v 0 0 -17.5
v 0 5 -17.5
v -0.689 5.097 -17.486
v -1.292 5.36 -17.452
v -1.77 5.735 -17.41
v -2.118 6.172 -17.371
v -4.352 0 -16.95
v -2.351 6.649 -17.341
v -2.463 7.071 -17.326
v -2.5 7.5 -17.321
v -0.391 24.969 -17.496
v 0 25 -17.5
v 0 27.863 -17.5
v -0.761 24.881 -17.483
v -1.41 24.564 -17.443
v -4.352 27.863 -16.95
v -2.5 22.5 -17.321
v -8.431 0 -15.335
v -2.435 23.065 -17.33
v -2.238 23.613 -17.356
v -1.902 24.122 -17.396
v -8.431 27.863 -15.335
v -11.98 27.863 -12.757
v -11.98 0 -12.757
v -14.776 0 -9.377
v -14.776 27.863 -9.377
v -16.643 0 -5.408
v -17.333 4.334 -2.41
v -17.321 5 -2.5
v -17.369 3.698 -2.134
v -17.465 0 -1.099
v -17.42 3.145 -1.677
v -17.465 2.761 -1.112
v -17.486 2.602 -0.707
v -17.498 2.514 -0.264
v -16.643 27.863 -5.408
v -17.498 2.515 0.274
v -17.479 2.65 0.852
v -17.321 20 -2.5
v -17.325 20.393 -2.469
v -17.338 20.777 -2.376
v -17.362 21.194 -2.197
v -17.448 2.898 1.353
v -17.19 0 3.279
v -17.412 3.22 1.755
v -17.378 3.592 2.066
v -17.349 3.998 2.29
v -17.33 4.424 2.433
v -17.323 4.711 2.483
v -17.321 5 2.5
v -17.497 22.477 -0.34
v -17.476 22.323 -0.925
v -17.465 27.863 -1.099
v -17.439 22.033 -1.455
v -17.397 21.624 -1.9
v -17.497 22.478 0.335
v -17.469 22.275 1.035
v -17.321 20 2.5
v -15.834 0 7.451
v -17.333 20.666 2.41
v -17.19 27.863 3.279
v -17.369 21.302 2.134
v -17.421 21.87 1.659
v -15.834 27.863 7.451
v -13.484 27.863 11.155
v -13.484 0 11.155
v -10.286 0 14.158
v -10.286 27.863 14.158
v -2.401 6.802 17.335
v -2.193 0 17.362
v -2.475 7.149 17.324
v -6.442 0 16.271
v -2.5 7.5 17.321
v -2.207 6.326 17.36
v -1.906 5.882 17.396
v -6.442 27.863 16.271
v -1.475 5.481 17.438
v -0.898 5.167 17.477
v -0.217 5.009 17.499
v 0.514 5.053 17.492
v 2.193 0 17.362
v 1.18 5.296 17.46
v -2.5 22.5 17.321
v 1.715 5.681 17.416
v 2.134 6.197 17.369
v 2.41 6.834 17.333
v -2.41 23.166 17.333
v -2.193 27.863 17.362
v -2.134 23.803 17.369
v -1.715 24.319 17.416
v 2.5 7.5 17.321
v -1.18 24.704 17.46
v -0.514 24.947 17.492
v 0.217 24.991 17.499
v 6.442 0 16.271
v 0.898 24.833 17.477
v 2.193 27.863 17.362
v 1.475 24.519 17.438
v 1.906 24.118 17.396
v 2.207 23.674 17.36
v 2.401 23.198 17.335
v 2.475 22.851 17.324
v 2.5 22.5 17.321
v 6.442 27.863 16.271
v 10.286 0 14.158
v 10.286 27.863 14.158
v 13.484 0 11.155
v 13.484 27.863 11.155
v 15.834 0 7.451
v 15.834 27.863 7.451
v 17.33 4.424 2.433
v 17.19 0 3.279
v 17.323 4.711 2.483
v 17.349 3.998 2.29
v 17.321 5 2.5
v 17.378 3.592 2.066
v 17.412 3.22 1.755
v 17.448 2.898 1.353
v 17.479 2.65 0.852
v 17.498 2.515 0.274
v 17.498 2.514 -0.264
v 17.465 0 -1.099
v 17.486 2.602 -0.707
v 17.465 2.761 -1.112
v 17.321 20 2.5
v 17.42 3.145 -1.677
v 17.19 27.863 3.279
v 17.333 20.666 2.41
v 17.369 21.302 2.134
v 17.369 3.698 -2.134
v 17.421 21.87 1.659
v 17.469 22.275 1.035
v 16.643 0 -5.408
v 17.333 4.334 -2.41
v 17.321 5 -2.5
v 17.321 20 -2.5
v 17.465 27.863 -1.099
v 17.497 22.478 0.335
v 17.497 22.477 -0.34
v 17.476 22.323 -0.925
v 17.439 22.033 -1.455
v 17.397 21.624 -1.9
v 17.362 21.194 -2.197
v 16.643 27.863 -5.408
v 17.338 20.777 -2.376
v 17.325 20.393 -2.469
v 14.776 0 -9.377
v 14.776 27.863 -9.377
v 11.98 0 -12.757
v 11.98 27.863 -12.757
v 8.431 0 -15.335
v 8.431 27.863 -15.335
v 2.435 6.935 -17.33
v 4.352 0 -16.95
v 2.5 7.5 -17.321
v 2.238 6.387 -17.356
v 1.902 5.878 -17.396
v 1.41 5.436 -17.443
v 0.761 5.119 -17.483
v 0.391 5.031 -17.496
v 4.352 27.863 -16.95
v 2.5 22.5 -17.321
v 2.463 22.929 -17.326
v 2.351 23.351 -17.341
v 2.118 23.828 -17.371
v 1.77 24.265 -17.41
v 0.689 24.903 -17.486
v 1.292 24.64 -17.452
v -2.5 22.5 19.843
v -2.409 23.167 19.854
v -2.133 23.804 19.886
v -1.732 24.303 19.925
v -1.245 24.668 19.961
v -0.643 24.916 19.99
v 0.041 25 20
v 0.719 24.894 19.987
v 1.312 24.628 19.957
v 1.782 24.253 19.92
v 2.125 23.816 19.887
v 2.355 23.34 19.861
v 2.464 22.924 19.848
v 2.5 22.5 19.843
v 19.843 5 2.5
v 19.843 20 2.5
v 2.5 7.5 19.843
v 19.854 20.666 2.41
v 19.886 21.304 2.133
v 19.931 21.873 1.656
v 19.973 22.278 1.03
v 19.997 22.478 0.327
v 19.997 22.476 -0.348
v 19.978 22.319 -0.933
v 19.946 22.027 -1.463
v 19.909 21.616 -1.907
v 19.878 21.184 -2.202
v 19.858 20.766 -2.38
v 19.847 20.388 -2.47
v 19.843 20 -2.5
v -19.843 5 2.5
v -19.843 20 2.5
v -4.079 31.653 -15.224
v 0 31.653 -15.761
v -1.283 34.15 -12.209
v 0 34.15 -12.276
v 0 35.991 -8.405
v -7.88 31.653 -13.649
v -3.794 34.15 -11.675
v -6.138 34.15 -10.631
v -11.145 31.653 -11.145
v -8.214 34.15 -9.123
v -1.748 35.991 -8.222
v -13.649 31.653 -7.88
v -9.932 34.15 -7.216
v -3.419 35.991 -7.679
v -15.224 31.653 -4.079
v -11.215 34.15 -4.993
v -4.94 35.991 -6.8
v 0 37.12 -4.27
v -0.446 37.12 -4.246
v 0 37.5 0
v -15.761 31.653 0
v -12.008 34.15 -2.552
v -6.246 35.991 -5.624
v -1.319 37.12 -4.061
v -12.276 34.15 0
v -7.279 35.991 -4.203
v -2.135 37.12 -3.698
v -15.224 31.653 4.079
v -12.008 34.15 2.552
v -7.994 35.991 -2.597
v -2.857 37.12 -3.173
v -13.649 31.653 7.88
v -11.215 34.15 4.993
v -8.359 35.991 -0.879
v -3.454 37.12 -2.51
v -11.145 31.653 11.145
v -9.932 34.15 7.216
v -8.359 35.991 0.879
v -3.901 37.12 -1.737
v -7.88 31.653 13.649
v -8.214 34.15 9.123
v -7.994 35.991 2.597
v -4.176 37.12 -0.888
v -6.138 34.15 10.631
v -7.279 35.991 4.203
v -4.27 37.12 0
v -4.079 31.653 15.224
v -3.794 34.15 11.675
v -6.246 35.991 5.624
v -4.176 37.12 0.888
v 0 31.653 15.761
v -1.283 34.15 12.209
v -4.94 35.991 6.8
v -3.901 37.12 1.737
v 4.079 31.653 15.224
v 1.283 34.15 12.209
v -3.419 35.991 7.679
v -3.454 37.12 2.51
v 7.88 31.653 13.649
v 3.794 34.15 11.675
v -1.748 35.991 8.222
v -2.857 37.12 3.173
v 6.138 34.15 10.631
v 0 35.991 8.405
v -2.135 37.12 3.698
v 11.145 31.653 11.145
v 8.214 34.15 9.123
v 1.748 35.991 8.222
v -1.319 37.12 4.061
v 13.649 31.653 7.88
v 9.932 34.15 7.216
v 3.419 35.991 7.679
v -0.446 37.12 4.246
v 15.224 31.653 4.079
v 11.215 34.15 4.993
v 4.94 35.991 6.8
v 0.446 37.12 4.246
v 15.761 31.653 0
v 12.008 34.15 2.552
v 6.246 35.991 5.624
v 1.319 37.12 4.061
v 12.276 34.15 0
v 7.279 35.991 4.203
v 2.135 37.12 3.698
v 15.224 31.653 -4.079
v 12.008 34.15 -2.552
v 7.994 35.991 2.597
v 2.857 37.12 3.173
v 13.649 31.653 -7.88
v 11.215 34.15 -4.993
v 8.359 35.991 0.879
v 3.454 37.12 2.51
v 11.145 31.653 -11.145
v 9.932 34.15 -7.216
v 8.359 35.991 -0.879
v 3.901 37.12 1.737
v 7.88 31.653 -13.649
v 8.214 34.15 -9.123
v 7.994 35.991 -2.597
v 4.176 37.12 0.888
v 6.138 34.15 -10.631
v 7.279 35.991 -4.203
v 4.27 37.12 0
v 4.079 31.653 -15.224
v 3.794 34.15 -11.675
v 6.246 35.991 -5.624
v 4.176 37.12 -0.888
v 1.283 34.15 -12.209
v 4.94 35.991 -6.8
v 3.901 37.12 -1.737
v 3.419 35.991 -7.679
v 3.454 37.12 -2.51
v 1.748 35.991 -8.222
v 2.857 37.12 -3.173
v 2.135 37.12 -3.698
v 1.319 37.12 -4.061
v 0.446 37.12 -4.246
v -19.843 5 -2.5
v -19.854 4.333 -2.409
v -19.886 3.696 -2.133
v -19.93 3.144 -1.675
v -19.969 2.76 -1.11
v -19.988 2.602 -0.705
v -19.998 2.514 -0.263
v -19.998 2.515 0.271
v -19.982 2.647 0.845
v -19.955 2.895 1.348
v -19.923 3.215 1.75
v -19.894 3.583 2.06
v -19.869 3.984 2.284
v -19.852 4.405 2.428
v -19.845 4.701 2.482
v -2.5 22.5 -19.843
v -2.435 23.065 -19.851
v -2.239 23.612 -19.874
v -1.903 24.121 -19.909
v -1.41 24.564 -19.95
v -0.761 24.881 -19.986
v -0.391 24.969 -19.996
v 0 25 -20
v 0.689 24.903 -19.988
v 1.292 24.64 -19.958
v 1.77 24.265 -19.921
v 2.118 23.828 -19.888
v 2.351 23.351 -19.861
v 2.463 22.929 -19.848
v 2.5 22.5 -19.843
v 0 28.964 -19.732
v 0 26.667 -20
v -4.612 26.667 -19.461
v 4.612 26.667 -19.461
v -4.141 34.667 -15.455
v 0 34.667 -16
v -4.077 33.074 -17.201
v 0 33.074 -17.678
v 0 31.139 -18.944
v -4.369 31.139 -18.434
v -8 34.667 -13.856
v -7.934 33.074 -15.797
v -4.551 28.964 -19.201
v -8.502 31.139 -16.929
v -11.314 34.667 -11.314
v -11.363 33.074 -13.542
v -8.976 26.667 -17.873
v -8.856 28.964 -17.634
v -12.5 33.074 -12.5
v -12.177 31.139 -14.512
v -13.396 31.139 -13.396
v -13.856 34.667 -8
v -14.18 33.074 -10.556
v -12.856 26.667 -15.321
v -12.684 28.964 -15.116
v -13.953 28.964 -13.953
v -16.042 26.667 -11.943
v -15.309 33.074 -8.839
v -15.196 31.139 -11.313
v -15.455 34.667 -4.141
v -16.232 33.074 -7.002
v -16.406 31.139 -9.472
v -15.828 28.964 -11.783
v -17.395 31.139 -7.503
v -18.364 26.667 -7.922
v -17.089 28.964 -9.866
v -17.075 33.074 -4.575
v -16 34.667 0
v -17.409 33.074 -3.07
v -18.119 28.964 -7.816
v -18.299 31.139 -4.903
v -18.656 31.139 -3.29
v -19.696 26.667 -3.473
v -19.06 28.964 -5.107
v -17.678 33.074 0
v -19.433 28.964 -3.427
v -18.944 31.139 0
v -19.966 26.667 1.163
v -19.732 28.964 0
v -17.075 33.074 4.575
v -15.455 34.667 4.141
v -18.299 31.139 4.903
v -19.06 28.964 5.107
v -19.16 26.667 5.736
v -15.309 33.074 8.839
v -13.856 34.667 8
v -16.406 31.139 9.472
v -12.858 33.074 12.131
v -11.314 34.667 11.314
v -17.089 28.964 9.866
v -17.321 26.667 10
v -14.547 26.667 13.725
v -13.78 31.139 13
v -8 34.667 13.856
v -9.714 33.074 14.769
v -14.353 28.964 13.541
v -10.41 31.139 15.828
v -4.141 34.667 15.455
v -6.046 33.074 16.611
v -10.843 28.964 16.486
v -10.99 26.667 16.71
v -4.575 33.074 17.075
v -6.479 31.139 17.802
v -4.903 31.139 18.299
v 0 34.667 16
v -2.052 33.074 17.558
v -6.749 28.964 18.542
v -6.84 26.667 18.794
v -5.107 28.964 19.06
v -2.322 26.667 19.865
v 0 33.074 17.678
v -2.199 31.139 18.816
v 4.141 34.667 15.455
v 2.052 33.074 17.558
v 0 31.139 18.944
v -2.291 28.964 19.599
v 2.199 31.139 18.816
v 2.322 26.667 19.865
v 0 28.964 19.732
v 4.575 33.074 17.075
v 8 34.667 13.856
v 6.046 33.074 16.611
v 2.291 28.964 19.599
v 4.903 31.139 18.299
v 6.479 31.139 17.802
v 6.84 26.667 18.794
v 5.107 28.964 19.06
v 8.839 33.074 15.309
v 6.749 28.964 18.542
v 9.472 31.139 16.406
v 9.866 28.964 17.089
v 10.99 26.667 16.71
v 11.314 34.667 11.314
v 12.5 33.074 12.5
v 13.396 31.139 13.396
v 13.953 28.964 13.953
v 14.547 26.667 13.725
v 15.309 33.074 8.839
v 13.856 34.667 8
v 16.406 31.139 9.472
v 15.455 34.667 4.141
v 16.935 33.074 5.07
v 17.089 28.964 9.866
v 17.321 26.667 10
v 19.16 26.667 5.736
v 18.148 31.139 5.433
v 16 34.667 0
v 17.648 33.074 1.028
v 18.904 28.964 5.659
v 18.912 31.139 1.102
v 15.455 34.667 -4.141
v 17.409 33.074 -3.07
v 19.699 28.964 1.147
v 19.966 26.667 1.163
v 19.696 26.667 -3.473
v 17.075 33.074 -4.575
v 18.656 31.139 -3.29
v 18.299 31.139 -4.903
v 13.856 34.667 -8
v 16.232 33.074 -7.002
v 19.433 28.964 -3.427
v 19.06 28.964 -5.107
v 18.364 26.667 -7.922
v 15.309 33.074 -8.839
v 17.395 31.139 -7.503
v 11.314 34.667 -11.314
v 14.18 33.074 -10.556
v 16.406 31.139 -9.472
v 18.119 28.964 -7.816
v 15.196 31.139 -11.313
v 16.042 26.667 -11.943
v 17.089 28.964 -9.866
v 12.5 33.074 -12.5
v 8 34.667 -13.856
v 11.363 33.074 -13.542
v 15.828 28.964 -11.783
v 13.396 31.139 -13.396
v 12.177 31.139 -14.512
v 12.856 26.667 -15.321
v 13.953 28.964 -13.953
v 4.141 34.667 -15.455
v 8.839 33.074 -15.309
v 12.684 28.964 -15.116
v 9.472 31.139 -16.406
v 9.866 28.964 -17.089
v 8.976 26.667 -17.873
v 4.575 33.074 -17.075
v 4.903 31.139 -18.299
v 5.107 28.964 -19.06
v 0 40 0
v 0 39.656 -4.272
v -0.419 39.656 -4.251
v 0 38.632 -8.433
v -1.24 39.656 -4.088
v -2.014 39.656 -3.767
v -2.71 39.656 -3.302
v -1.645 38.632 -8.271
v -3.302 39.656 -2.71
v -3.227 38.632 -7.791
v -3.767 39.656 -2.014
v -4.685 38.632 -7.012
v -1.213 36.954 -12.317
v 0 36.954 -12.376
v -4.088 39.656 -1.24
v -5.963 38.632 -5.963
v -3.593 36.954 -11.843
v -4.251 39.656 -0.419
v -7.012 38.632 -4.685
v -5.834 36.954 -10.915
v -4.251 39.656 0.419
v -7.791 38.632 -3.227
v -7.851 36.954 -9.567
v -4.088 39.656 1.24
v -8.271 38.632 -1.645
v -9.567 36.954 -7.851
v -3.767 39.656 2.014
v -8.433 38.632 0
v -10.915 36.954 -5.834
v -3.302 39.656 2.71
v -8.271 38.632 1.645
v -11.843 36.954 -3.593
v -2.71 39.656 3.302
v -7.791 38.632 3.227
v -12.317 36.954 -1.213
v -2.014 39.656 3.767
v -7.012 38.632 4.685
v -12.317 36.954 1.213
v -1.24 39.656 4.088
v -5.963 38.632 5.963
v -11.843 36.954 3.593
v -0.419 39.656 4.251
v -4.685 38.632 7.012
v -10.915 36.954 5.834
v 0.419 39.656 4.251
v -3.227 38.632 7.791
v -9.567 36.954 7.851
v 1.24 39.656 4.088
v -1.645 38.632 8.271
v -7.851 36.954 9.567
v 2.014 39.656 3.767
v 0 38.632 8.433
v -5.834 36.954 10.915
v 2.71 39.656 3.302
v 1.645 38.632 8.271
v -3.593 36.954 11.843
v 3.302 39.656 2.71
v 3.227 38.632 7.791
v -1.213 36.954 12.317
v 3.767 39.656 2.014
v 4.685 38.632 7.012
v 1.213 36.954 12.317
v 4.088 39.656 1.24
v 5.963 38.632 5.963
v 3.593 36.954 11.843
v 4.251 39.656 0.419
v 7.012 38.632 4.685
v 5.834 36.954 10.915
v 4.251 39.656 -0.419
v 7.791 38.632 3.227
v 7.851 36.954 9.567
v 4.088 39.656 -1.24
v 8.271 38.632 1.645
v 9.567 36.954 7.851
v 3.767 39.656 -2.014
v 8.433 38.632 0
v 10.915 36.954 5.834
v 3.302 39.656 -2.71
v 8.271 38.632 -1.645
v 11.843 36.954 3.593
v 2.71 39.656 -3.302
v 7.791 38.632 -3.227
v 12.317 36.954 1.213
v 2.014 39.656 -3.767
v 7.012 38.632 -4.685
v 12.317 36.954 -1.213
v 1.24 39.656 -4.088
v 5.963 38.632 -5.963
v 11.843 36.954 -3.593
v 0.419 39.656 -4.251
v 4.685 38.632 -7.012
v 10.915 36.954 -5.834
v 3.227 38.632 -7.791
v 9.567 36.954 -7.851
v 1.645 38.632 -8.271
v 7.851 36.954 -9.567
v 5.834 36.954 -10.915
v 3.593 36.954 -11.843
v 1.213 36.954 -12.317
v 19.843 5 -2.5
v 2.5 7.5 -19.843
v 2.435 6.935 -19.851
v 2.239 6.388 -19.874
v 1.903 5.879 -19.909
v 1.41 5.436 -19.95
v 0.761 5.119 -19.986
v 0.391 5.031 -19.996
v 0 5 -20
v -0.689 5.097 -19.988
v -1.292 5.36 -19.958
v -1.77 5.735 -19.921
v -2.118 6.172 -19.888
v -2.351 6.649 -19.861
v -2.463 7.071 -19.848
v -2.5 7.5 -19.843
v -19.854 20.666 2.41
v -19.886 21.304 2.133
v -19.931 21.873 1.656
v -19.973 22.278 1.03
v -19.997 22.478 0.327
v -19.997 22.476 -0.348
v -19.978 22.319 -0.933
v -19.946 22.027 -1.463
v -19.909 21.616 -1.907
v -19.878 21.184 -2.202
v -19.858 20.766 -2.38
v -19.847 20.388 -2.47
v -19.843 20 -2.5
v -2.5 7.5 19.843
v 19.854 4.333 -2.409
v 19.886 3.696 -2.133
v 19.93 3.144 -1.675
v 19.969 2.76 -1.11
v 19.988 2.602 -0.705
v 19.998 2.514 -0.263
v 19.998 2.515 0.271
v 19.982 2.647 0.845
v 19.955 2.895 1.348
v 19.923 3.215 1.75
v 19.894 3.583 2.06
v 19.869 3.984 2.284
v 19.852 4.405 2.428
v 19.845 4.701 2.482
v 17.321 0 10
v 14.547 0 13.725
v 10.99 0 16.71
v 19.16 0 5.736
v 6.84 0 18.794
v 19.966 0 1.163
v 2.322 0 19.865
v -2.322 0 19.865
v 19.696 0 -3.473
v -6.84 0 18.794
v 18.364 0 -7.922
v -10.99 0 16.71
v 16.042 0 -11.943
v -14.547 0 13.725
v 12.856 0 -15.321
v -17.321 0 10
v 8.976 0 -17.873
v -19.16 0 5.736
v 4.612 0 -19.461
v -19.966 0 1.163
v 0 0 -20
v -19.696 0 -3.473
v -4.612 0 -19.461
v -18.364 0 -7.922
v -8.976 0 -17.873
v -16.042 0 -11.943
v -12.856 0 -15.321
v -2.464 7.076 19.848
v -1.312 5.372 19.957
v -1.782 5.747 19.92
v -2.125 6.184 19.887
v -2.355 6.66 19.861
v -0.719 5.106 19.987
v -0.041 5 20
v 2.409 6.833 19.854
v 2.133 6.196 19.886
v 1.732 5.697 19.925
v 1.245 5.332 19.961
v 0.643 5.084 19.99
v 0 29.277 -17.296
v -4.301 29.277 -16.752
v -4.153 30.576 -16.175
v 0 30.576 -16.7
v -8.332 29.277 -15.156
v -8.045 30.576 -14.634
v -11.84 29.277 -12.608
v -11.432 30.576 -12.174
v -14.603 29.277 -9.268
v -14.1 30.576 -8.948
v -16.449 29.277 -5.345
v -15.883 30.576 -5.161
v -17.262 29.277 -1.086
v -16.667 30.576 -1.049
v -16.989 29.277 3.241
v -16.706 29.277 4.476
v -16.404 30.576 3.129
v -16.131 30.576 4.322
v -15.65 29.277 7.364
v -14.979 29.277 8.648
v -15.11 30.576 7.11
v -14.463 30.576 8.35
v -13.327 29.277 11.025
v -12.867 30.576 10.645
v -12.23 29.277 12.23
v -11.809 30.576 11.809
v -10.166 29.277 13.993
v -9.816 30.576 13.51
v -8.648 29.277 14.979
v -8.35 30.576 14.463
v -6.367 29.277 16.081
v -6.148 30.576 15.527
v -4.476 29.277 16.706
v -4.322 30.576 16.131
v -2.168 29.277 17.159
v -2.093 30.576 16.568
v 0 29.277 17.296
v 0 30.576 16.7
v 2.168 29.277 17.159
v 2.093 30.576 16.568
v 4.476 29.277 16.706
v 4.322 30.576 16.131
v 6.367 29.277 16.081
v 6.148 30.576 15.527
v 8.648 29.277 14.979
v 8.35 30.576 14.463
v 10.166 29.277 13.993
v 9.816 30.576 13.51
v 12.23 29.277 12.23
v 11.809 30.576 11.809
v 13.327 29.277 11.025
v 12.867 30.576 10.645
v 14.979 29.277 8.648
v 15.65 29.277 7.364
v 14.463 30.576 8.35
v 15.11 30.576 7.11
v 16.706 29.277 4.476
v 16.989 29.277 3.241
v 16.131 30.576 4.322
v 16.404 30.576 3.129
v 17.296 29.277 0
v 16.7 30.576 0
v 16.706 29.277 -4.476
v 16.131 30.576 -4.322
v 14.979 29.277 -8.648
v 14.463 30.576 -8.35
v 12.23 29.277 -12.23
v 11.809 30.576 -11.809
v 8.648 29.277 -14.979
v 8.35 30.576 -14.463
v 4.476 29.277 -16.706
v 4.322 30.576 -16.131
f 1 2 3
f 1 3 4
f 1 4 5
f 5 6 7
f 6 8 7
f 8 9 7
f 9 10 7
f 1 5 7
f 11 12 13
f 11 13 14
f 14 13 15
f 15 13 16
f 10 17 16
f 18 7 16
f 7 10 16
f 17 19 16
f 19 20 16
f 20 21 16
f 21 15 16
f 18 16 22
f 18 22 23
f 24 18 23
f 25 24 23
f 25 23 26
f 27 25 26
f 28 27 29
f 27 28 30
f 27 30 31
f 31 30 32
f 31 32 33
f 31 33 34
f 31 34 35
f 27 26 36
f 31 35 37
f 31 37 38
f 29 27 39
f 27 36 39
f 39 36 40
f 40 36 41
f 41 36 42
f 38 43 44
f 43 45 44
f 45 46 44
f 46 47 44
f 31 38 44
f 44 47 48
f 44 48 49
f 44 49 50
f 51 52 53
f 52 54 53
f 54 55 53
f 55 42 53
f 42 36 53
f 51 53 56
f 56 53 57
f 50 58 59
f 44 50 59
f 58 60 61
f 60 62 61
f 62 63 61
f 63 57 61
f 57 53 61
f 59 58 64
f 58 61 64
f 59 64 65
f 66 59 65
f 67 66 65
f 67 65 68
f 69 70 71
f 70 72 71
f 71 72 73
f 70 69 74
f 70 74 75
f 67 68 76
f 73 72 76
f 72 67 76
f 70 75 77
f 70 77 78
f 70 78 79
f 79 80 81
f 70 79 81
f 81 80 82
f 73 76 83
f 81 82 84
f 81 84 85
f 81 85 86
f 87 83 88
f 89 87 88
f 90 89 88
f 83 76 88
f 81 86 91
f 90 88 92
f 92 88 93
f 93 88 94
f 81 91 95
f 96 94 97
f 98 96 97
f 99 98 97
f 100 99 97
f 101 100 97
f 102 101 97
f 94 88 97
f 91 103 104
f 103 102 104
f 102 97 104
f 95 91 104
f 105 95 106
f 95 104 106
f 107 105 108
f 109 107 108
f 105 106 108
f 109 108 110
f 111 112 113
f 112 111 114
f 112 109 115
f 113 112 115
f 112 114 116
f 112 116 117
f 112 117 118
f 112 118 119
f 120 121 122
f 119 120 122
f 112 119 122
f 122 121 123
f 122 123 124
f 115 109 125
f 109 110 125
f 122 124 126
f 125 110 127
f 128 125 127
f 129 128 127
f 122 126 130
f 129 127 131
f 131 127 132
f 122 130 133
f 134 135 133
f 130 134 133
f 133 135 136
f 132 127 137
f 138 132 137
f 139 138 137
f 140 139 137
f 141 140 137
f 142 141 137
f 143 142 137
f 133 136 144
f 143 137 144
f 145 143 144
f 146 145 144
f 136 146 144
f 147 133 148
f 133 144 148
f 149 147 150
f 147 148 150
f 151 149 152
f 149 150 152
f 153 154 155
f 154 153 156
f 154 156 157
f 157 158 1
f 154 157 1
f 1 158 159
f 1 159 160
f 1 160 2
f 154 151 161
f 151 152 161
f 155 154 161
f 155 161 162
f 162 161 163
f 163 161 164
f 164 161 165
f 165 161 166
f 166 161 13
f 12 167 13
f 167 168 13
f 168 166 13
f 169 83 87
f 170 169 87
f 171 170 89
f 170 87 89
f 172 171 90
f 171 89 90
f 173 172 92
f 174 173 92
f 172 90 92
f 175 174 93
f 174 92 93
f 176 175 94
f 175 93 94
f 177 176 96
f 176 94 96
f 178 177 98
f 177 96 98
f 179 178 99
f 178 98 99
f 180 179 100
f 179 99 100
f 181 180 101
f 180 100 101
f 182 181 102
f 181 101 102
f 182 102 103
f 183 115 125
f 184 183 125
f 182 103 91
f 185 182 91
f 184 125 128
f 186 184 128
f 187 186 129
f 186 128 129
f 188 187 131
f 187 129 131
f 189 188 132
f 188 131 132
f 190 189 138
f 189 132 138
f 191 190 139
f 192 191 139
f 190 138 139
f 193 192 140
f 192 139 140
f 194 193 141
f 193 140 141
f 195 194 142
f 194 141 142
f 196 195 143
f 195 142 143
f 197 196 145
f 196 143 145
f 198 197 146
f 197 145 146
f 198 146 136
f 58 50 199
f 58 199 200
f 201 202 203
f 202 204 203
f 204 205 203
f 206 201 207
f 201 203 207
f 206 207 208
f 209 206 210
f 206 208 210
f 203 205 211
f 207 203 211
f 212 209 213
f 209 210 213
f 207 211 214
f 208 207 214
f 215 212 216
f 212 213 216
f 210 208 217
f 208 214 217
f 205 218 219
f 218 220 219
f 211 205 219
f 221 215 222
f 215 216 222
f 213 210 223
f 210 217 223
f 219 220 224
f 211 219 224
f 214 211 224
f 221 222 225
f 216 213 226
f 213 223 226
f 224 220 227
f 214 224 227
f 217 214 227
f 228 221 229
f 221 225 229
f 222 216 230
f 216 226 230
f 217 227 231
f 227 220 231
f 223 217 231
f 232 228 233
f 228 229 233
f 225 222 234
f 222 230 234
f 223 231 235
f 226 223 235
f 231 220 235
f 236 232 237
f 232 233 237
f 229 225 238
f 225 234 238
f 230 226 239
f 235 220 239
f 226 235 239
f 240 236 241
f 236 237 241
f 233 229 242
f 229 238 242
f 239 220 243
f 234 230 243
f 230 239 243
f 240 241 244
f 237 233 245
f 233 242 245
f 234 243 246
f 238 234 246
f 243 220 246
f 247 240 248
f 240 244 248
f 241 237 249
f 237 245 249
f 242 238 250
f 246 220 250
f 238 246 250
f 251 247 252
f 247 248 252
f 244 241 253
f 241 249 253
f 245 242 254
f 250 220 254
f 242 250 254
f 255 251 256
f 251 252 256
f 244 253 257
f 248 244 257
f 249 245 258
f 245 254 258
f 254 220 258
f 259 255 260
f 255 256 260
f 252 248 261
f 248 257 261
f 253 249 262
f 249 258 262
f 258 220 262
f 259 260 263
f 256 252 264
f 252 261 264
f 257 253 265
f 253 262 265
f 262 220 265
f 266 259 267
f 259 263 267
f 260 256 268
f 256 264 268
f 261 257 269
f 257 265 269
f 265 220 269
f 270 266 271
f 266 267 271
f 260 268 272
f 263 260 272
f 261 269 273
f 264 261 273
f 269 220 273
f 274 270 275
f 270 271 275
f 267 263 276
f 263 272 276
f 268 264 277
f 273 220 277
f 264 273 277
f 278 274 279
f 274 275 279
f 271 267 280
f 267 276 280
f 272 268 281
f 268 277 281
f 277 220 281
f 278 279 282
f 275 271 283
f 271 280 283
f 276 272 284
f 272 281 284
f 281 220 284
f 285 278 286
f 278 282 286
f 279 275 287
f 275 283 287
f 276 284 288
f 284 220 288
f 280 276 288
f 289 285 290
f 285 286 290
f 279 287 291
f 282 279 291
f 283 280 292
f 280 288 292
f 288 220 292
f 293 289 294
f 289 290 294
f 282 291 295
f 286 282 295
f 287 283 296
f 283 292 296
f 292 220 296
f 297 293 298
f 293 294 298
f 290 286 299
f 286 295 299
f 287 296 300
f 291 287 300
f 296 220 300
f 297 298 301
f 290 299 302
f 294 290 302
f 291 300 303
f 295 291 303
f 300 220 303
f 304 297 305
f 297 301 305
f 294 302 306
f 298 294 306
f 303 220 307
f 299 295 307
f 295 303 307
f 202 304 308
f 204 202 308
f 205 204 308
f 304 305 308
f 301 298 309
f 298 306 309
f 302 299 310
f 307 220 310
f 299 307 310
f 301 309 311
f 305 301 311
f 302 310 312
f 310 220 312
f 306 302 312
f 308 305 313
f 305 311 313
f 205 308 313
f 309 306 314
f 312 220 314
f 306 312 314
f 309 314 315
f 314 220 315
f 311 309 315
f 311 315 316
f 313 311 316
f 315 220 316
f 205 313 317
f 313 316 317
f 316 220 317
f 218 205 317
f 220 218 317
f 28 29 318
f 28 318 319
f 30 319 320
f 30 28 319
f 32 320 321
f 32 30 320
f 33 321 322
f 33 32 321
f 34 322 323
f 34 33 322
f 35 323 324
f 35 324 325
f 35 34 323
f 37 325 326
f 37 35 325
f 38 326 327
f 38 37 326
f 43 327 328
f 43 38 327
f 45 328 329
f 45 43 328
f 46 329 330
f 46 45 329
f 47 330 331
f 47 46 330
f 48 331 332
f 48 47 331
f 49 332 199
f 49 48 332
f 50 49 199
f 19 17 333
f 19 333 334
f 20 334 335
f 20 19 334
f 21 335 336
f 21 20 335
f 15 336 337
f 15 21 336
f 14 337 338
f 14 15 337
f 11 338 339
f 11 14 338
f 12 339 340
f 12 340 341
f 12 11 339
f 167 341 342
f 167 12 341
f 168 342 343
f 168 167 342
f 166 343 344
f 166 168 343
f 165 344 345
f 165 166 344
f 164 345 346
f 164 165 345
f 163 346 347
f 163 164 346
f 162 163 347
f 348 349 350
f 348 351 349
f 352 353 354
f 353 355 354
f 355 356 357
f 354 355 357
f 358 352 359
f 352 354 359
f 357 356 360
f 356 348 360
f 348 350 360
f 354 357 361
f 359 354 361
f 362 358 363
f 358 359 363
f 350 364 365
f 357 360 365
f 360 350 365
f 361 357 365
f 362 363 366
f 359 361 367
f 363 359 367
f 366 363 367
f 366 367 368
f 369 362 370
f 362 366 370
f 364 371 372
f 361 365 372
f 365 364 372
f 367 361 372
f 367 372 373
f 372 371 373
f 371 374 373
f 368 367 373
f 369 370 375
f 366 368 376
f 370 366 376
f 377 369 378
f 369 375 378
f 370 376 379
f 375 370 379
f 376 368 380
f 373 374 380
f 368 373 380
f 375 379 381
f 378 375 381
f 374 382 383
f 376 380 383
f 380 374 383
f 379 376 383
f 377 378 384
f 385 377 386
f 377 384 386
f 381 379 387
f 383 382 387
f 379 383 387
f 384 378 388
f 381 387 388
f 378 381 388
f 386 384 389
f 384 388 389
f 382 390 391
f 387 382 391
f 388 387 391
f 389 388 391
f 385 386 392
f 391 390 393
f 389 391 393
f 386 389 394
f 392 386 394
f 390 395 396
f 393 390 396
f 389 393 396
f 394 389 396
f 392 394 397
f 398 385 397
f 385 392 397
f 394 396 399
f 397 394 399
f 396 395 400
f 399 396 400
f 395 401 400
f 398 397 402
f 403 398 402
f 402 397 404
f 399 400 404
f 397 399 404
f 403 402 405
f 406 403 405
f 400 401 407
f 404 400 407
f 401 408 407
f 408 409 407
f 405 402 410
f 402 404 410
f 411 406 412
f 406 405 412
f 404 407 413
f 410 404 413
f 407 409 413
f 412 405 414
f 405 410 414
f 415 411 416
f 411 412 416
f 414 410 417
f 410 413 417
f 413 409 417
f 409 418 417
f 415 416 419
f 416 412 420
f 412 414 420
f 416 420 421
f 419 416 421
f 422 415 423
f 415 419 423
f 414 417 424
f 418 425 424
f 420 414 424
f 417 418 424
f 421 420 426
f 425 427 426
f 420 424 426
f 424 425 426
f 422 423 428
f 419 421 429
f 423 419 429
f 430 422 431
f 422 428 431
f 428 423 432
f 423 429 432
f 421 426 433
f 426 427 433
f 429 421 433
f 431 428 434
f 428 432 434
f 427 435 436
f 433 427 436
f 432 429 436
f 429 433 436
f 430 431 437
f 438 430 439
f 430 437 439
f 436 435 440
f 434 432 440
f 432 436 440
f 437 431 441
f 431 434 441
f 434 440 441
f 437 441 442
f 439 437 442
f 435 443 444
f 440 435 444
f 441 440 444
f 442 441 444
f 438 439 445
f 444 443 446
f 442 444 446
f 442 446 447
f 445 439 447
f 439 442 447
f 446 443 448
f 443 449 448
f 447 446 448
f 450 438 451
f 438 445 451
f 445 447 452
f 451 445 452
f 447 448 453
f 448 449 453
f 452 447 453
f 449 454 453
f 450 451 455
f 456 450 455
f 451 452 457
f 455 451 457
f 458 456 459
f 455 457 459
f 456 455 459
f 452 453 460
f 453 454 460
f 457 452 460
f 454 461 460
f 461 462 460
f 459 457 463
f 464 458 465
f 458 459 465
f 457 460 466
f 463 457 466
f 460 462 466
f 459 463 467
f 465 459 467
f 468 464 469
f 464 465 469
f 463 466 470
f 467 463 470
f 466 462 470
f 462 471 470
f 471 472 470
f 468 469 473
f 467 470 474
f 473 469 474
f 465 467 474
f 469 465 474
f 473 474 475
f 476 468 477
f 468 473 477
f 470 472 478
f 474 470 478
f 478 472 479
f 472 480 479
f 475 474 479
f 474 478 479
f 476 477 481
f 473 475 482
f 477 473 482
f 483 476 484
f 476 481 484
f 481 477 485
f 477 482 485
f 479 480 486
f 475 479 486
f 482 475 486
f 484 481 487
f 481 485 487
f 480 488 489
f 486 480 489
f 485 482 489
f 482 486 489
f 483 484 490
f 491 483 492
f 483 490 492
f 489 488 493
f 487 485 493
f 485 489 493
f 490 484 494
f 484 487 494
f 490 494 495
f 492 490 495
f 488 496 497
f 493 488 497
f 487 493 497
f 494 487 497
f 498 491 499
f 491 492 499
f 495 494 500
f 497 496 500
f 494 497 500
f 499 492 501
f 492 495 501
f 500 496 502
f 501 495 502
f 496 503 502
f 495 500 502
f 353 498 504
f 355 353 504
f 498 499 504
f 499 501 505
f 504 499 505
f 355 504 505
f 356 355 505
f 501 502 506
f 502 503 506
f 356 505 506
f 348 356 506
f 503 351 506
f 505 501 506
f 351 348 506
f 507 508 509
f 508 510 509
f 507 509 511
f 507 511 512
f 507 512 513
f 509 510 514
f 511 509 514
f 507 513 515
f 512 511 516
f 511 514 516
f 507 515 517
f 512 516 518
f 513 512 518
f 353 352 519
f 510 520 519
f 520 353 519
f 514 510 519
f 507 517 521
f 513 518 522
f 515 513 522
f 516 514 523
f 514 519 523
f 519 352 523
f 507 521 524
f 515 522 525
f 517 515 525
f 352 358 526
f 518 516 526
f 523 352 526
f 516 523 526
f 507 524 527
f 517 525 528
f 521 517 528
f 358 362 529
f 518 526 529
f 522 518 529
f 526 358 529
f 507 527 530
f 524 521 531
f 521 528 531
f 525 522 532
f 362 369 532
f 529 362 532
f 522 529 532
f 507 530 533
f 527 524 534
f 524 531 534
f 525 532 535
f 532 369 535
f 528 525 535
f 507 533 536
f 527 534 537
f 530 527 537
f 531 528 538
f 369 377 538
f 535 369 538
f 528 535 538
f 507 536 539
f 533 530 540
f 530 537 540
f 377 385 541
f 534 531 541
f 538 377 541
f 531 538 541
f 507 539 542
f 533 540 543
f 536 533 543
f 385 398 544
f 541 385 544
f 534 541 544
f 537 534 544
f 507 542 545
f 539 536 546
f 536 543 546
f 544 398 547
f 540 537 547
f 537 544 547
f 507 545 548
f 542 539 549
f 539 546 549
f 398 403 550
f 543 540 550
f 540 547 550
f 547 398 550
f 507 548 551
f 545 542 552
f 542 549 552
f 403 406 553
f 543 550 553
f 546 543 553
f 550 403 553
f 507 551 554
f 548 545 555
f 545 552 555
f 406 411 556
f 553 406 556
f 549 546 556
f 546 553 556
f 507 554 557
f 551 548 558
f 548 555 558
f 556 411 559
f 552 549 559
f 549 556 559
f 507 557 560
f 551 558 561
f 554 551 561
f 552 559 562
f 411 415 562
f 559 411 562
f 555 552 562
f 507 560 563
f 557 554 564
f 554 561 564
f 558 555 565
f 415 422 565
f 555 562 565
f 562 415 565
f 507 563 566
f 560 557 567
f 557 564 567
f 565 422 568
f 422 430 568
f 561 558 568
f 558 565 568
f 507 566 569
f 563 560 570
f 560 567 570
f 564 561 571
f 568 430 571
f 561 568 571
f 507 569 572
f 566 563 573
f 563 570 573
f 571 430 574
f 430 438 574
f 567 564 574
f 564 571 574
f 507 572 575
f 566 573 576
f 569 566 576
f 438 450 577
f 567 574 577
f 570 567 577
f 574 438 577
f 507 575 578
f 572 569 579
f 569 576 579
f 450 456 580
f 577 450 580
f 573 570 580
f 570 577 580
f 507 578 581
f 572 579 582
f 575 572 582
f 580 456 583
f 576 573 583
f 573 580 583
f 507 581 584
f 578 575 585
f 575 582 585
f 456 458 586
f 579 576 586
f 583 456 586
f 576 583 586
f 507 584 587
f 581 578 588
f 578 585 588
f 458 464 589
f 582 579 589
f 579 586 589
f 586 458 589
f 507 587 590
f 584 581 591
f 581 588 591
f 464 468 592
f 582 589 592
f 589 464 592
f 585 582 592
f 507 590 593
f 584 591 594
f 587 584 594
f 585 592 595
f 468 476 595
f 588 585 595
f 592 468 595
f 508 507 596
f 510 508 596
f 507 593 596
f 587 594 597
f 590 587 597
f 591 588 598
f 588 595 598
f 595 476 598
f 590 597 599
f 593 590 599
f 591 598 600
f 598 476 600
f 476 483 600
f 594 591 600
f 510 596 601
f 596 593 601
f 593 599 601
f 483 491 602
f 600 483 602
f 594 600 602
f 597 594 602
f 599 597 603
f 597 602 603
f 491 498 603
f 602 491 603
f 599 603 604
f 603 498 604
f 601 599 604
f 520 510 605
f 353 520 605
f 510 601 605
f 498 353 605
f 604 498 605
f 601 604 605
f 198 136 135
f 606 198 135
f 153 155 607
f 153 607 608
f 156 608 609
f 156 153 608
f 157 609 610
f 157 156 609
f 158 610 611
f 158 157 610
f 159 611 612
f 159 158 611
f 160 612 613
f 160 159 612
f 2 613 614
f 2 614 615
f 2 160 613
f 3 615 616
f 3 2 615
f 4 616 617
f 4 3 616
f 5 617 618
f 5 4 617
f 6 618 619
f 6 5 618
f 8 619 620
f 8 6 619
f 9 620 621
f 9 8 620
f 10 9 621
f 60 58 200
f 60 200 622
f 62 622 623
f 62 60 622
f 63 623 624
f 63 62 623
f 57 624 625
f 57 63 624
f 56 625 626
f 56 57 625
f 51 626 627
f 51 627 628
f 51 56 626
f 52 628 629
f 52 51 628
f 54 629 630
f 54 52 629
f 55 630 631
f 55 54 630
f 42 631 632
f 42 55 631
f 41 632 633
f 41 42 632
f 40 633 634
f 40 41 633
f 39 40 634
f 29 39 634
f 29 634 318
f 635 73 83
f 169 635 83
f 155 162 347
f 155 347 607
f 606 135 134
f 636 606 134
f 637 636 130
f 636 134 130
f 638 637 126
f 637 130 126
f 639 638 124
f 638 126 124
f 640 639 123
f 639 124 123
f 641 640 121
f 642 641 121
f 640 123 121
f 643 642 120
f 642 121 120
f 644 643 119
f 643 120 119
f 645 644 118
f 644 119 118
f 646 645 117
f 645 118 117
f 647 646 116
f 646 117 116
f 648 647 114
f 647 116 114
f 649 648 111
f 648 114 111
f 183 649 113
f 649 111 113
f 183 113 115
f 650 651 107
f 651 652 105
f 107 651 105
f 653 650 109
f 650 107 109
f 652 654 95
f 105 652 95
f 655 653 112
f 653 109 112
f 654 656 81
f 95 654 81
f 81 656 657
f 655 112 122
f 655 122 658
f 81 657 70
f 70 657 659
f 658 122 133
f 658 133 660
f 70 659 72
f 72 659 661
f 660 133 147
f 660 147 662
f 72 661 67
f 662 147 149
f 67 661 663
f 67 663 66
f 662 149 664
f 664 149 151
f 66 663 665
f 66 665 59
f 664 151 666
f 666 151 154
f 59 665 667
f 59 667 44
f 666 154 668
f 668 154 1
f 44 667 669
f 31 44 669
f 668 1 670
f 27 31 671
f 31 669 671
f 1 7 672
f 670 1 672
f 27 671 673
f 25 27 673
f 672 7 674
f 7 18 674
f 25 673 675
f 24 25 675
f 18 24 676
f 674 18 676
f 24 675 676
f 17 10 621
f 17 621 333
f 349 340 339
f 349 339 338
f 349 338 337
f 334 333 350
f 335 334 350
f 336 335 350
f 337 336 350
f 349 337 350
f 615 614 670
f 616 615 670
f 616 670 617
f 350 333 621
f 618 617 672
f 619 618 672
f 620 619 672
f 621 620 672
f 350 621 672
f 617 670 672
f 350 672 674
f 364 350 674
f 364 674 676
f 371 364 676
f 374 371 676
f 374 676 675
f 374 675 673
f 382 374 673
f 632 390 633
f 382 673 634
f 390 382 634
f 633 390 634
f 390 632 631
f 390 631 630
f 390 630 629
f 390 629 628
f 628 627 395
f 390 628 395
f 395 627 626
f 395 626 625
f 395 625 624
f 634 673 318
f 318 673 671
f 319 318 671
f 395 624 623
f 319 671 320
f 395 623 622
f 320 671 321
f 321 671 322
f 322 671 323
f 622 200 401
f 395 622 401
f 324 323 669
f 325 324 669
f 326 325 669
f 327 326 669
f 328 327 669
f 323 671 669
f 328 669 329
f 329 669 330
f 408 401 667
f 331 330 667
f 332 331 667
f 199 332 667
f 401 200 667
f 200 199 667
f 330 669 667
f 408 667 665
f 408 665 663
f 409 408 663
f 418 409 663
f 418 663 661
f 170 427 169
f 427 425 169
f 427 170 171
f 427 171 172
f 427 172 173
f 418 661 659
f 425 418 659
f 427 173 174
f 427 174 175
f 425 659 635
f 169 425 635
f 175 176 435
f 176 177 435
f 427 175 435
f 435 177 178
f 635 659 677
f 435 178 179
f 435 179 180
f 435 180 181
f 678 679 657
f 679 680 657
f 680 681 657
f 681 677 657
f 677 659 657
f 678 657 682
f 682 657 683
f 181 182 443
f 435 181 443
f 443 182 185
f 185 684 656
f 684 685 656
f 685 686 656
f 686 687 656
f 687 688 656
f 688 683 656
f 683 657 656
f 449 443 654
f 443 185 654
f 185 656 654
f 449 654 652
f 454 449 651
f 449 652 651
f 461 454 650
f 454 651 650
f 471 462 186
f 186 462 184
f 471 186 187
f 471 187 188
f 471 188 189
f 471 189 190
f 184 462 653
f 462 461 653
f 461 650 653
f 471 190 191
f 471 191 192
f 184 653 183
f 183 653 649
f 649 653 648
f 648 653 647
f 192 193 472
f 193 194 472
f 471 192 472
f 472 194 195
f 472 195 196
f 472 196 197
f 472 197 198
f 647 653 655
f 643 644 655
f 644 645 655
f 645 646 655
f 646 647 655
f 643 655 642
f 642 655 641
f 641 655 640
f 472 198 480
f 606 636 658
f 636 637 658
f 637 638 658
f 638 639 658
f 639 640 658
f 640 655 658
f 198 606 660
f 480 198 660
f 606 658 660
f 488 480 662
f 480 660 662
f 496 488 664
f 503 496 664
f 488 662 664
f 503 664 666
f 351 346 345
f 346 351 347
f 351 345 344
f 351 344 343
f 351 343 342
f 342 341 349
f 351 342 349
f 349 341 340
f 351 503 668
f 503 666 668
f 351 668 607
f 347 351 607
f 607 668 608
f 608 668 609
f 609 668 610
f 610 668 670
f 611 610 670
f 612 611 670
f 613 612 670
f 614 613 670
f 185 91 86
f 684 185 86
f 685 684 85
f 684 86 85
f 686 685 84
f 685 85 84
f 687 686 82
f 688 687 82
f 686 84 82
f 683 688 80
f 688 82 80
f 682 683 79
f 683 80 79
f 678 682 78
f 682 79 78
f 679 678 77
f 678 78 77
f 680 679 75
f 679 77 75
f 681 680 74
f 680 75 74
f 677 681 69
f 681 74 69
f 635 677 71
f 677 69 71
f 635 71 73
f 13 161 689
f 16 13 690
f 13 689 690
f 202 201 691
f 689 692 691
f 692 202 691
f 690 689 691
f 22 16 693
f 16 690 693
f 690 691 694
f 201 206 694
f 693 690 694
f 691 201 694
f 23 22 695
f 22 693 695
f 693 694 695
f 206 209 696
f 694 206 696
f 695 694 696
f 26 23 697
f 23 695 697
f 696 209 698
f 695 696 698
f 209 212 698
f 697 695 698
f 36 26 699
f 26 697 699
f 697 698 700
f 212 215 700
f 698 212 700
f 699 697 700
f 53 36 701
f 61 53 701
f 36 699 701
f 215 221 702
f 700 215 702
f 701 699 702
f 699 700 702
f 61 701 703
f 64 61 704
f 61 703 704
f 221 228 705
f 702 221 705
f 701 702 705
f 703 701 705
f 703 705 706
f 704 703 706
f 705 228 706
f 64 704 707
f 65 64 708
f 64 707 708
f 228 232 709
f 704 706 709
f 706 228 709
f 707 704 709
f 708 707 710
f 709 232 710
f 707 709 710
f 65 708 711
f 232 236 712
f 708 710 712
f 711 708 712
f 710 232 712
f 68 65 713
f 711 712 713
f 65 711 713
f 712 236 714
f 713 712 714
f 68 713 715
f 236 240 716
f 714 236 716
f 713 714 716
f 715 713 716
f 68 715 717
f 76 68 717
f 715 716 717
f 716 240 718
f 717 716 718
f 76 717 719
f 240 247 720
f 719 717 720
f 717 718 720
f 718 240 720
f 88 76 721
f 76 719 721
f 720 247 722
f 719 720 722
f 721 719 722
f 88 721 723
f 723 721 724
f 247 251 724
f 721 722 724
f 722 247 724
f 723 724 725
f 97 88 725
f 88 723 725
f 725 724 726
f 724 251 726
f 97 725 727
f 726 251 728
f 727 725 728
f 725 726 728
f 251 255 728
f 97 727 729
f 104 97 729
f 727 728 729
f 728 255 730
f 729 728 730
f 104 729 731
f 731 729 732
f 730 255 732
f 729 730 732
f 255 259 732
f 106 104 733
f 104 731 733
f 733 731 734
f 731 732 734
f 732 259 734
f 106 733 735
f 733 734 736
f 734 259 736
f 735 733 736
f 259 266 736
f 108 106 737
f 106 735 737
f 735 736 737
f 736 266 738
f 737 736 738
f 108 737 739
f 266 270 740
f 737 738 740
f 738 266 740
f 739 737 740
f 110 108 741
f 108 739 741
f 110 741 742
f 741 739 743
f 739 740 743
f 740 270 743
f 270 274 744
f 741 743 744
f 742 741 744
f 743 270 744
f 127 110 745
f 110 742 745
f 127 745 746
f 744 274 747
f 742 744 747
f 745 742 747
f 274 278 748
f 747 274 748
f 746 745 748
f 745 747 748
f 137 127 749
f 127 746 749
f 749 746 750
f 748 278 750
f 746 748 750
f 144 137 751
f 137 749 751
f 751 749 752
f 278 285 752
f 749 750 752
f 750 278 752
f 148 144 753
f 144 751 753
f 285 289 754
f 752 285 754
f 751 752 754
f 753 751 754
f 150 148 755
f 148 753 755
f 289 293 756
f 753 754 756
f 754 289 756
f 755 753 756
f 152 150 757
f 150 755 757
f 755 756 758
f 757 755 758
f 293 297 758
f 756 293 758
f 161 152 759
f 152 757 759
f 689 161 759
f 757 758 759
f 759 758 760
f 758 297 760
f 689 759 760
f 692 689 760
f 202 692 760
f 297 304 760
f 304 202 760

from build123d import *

# Parameters (mm, degrees)
TAGLIO_ESTRUSIONE1_DEPTH      = 21.0000001
TAGLIO_ESTRUSIONE1_DEPTH_BACK = 21.0000001
TAGLIO_ESTRUSIONE2_DEPTH      = 21.0000001
TAGLIO_ESTRUSIONE2_DEPTH_BACK = 21.0000001


with BuildPart() as part:
    # Schizzo1 → Rivoluzione1 (revolve)
    with BuildSketch(Plane.XY, mode=Mode.PRIVATE) as rivoluzione1_sk:
        with BuildLine():
            Line((20, 26.666666667), (20, 0))
            Line((20, 0), (17.5, 0))
            Line((17.5, 0), (17.5, 27.862996478))
            ThreePointArc((17.5, 27.862996478), (17.044466296, 29.948140619), (15.760869565, 31.653343386))
            ThreePointArc((15.760869565, 31.653343386), (8.40518297, 35.991238731), (0, 37.5))
            Line((0, 37.5), (0, 40))
            ThreePointArc((0, 40), (8.432740427, 38.631554615), (16, 34.666666667))
            ThreePointArc((16, 34.666666667), (18.94427191, 31.138802622), (20, 26.666666667))
        make_face()
    revolve(rivoluzione1_sk.sketch.rotate(Axis((0, 0, 0), (0, 1, 0)), 90), axis=Axis((0, 0, 0), (0, 1, 0)))  # turned: the seam where the file's is

    # Schizzo2 → Taglio-Estrusione1 (cut, two sides)
    with BuildSketch(Plane.XY) as taglio_estrusione1_sk:
        with BuildLine():
            Line((2.5, 22.5), (2.5, 7.5))
            ThreePointArc((2.5, 7.5), (0, 5), (-2.5, 7.5))
            Line((-2.5, 7.5), (-2.5, 22.5))
            ThreePointArc((-2.5, 22.5), (0, 25), (2.5, 22.5))
        make_face()
    extrude(amount=TAGLIO_ESTRUSIONE1_DEPTH, mode=Mode.SUBTRACT)
    extrude(taglio_estrusione1_sk.sketch, amount=-TAGLIO_ESTRUSIONE1_DEPTH_BACK, mode=Mode.SUBTRACT)

    # Schizzo3 → Taglio-Estrusione2 (cut, two sides)
    with BuildSketch(Plane(origin=(0, 0, 0), x_dir=(0, 0, -1), z_dir=(1, 0, 0))) as taglio_estrusione2_sk:
        with BuildLine():
            Line((2.5, 20), (2.5, 5))
            ThreePointArc((2.5, 5), (0, 2.5), (-2.5, 5))
            Line((-2.5, 5), (-2.5, 20))
            ThreePointArc((-2.5, 20), (0, 22.5), (2.5, 20))
        make_face()
    extrude(amount=TAGLIO_ESTRUSIONE2_DEPTH, mode=Mode.SUBTRACT)
    extrude(taglio_estrusione2_sk.sketch, amount=-TAGLIO_ESTRUSIONE2_DEPTH_BACK, mode=Mode.SUBTRACT)


solid = part.part
